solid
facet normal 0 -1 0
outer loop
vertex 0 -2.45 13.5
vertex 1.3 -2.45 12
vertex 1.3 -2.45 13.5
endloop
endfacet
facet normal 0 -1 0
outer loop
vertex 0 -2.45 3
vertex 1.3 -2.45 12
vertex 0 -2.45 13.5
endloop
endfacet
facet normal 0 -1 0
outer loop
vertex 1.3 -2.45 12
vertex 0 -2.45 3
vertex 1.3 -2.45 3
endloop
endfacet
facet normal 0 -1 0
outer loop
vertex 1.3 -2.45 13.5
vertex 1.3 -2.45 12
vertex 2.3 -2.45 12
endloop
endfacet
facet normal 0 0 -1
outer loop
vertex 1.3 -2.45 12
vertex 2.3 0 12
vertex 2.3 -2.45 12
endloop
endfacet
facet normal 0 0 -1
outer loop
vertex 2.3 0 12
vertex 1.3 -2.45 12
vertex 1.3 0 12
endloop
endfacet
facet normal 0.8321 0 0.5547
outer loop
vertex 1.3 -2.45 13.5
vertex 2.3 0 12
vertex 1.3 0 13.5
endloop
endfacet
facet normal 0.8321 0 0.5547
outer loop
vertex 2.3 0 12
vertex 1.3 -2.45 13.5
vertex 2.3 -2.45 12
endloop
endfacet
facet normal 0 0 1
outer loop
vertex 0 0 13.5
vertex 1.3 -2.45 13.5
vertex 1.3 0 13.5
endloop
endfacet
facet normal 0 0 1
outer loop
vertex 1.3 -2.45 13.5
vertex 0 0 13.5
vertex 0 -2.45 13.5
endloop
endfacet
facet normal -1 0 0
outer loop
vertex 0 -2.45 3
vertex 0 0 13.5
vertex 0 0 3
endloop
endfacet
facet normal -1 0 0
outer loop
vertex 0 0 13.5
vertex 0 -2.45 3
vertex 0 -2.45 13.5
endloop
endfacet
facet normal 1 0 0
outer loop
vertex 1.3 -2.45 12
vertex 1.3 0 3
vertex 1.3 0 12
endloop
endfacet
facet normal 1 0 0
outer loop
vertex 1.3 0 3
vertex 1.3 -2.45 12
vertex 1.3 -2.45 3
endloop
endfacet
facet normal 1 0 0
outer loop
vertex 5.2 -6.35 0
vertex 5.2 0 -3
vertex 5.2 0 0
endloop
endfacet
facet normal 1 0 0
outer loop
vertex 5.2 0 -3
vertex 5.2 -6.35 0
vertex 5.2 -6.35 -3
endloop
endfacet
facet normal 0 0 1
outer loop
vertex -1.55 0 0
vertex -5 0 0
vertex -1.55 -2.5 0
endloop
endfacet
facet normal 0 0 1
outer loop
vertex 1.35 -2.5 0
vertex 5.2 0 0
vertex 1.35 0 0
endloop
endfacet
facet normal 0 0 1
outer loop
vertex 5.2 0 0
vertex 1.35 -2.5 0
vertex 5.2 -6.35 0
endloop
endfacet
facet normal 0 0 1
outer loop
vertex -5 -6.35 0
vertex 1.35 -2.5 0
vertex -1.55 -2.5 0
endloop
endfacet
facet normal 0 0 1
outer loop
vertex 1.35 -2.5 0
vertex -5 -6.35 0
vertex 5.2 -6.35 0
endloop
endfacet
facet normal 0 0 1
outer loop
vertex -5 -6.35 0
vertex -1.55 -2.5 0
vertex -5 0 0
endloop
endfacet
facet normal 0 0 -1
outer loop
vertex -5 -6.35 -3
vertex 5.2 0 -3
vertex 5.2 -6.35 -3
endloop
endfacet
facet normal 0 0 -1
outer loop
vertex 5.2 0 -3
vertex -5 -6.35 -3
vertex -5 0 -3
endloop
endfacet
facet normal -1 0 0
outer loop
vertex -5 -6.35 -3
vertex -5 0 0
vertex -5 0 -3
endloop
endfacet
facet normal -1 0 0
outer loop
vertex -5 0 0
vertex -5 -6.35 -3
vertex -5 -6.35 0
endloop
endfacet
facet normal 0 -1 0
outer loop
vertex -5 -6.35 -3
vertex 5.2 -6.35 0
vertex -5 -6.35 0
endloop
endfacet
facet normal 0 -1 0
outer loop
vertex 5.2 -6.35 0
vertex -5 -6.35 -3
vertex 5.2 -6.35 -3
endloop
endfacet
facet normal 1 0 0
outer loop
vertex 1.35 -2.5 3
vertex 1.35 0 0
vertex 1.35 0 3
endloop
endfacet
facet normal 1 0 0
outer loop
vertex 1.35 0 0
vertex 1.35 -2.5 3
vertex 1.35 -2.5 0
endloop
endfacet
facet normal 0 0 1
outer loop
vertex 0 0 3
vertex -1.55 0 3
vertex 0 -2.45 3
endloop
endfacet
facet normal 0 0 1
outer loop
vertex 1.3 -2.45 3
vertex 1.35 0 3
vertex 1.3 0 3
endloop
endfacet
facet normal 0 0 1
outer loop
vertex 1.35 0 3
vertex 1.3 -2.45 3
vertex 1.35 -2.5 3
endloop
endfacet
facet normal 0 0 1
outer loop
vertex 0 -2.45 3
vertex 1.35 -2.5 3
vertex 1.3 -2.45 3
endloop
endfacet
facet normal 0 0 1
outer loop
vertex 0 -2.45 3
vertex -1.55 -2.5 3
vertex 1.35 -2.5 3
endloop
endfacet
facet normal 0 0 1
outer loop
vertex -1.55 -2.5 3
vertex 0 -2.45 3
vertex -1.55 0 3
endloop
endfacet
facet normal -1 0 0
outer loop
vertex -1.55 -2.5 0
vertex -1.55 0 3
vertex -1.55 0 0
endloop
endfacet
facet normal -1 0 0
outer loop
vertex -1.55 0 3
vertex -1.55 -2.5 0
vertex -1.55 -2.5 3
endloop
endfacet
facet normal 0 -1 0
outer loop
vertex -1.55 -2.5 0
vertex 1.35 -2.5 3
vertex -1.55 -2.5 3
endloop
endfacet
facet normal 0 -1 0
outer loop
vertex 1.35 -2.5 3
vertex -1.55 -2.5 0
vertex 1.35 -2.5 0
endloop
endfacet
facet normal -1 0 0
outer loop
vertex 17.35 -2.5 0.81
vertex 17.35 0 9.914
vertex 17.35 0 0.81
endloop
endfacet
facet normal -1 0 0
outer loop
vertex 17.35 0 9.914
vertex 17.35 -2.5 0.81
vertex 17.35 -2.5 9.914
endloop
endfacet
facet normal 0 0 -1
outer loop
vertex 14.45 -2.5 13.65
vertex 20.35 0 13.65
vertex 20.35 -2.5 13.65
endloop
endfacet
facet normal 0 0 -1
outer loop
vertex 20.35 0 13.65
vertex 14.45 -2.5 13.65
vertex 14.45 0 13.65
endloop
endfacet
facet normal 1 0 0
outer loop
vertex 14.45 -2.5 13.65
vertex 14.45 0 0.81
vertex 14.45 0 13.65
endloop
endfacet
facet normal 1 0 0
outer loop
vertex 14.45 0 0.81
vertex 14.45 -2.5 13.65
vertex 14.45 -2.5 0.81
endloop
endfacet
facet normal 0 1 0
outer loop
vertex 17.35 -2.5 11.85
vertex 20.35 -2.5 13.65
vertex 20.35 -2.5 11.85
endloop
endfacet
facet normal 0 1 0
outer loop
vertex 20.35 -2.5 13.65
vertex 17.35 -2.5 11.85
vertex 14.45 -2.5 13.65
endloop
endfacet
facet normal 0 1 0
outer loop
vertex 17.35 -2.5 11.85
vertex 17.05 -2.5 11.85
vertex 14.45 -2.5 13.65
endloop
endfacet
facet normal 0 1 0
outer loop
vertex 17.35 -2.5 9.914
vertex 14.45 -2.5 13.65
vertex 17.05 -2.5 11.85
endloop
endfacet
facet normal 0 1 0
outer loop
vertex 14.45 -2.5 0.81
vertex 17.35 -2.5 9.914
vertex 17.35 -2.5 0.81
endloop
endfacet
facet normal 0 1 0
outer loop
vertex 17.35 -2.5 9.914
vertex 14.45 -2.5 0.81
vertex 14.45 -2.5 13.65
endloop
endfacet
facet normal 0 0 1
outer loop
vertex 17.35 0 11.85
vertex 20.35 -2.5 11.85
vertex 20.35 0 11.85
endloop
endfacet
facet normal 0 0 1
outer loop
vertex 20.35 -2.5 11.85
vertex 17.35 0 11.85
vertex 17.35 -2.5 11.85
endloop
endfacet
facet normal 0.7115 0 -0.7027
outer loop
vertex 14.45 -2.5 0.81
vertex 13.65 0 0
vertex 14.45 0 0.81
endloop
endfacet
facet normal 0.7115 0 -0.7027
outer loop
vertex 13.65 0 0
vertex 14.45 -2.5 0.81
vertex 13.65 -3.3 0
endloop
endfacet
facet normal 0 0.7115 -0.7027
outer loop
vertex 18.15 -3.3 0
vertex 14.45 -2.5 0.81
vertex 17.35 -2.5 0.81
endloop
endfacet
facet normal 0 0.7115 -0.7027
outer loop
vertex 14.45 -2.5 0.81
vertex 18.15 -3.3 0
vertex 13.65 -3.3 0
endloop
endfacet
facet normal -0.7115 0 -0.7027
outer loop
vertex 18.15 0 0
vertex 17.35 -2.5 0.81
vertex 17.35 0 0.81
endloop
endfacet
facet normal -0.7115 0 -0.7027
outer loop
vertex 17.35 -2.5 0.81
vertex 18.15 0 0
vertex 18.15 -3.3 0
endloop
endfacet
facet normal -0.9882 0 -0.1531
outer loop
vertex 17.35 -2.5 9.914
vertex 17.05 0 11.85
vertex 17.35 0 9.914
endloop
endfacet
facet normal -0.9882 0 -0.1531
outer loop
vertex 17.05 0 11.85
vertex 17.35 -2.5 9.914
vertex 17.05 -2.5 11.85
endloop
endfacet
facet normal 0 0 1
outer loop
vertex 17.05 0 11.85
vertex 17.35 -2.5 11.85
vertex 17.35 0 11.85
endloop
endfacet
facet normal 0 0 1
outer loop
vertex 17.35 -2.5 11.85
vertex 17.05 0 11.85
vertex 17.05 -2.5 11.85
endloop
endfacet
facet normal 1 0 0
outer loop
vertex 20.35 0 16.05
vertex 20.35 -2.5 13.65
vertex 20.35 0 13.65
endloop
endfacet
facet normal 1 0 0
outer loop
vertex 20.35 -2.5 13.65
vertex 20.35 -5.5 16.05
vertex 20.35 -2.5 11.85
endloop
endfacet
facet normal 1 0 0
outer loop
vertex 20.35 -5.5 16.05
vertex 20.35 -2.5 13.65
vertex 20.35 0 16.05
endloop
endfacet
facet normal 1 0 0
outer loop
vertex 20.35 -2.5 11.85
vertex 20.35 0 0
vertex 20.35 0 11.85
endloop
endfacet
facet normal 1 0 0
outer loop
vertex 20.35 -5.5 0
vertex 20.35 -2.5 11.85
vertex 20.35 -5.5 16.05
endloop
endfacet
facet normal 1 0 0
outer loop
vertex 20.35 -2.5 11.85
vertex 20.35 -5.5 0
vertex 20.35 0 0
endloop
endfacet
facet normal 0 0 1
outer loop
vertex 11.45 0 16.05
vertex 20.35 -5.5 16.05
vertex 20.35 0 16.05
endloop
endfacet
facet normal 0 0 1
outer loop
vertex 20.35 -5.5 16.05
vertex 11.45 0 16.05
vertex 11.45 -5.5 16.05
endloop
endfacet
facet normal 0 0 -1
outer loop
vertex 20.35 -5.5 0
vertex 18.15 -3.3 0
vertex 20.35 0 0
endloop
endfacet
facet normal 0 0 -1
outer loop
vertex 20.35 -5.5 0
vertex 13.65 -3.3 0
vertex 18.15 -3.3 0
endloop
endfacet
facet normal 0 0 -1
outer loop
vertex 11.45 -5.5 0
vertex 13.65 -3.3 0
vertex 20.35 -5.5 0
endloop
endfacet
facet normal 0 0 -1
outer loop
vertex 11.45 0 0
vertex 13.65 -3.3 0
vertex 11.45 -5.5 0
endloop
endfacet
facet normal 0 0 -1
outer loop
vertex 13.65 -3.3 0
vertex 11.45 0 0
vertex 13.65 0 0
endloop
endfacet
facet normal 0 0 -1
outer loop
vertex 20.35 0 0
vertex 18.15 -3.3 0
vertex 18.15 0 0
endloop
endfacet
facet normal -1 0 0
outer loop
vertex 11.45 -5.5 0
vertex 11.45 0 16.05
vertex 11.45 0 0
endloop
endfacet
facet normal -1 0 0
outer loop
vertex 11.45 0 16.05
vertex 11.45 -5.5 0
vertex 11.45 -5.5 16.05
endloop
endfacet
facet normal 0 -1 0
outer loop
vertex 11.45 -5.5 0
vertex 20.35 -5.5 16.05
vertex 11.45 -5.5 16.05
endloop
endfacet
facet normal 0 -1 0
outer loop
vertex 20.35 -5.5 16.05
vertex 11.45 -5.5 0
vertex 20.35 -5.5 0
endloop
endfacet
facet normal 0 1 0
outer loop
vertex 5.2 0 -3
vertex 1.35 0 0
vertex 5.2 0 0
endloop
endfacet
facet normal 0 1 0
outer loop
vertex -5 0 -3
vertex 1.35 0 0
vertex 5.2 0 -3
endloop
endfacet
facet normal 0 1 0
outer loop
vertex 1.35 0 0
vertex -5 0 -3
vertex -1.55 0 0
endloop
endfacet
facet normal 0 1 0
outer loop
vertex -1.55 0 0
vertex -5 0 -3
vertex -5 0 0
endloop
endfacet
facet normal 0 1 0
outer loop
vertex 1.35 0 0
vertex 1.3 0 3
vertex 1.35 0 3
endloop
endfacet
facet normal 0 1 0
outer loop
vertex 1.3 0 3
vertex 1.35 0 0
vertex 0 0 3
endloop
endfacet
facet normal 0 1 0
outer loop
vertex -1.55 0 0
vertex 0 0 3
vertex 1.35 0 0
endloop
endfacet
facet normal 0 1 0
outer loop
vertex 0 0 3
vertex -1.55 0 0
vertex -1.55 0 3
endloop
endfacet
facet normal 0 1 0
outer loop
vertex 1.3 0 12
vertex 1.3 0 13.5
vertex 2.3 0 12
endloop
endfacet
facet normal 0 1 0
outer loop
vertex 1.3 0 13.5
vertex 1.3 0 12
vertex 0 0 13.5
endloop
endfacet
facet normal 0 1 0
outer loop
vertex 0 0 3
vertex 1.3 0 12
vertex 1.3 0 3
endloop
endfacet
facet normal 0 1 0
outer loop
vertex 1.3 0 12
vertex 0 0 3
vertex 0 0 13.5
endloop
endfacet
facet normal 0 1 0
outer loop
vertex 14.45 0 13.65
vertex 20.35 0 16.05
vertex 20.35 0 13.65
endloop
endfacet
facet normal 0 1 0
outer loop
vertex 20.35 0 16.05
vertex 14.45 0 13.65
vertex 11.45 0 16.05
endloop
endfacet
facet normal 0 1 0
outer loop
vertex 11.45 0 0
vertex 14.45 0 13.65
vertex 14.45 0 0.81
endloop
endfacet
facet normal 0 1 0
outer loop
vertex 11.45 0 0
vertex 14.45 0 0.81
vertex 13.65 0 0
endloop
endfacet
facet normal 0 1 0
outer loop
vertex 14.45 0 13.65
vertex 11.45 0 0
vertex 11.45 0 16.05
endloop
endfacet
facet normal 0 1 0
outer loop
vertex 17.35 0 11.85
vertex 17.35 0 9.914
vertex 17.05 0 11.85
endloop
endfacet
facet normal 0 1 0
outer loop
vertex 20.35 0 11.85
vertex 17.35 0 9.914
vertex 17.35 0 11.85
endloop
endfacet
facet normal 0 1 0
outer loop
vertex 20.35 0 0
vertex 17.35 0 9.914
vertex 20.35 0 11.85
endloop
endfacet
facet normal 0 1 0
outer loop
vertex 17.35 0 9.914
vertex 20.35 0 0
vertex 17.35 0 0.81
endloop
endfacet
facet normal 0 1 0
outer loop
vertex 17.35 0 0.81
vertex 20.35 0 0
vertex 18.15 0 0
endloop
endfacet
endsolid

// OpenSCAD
use <connector.scad>
$fn = 64;
// male (left) and female (right), both sliced at Y=0, no overlap
intersection() {
    union() {
        color("SteelBlue")                       snap_male();
        color("Tan")        translate([16,0,0])  snap_female();
    }
    translate([-60,-60,-80]) cube([120,60,180]);
}
